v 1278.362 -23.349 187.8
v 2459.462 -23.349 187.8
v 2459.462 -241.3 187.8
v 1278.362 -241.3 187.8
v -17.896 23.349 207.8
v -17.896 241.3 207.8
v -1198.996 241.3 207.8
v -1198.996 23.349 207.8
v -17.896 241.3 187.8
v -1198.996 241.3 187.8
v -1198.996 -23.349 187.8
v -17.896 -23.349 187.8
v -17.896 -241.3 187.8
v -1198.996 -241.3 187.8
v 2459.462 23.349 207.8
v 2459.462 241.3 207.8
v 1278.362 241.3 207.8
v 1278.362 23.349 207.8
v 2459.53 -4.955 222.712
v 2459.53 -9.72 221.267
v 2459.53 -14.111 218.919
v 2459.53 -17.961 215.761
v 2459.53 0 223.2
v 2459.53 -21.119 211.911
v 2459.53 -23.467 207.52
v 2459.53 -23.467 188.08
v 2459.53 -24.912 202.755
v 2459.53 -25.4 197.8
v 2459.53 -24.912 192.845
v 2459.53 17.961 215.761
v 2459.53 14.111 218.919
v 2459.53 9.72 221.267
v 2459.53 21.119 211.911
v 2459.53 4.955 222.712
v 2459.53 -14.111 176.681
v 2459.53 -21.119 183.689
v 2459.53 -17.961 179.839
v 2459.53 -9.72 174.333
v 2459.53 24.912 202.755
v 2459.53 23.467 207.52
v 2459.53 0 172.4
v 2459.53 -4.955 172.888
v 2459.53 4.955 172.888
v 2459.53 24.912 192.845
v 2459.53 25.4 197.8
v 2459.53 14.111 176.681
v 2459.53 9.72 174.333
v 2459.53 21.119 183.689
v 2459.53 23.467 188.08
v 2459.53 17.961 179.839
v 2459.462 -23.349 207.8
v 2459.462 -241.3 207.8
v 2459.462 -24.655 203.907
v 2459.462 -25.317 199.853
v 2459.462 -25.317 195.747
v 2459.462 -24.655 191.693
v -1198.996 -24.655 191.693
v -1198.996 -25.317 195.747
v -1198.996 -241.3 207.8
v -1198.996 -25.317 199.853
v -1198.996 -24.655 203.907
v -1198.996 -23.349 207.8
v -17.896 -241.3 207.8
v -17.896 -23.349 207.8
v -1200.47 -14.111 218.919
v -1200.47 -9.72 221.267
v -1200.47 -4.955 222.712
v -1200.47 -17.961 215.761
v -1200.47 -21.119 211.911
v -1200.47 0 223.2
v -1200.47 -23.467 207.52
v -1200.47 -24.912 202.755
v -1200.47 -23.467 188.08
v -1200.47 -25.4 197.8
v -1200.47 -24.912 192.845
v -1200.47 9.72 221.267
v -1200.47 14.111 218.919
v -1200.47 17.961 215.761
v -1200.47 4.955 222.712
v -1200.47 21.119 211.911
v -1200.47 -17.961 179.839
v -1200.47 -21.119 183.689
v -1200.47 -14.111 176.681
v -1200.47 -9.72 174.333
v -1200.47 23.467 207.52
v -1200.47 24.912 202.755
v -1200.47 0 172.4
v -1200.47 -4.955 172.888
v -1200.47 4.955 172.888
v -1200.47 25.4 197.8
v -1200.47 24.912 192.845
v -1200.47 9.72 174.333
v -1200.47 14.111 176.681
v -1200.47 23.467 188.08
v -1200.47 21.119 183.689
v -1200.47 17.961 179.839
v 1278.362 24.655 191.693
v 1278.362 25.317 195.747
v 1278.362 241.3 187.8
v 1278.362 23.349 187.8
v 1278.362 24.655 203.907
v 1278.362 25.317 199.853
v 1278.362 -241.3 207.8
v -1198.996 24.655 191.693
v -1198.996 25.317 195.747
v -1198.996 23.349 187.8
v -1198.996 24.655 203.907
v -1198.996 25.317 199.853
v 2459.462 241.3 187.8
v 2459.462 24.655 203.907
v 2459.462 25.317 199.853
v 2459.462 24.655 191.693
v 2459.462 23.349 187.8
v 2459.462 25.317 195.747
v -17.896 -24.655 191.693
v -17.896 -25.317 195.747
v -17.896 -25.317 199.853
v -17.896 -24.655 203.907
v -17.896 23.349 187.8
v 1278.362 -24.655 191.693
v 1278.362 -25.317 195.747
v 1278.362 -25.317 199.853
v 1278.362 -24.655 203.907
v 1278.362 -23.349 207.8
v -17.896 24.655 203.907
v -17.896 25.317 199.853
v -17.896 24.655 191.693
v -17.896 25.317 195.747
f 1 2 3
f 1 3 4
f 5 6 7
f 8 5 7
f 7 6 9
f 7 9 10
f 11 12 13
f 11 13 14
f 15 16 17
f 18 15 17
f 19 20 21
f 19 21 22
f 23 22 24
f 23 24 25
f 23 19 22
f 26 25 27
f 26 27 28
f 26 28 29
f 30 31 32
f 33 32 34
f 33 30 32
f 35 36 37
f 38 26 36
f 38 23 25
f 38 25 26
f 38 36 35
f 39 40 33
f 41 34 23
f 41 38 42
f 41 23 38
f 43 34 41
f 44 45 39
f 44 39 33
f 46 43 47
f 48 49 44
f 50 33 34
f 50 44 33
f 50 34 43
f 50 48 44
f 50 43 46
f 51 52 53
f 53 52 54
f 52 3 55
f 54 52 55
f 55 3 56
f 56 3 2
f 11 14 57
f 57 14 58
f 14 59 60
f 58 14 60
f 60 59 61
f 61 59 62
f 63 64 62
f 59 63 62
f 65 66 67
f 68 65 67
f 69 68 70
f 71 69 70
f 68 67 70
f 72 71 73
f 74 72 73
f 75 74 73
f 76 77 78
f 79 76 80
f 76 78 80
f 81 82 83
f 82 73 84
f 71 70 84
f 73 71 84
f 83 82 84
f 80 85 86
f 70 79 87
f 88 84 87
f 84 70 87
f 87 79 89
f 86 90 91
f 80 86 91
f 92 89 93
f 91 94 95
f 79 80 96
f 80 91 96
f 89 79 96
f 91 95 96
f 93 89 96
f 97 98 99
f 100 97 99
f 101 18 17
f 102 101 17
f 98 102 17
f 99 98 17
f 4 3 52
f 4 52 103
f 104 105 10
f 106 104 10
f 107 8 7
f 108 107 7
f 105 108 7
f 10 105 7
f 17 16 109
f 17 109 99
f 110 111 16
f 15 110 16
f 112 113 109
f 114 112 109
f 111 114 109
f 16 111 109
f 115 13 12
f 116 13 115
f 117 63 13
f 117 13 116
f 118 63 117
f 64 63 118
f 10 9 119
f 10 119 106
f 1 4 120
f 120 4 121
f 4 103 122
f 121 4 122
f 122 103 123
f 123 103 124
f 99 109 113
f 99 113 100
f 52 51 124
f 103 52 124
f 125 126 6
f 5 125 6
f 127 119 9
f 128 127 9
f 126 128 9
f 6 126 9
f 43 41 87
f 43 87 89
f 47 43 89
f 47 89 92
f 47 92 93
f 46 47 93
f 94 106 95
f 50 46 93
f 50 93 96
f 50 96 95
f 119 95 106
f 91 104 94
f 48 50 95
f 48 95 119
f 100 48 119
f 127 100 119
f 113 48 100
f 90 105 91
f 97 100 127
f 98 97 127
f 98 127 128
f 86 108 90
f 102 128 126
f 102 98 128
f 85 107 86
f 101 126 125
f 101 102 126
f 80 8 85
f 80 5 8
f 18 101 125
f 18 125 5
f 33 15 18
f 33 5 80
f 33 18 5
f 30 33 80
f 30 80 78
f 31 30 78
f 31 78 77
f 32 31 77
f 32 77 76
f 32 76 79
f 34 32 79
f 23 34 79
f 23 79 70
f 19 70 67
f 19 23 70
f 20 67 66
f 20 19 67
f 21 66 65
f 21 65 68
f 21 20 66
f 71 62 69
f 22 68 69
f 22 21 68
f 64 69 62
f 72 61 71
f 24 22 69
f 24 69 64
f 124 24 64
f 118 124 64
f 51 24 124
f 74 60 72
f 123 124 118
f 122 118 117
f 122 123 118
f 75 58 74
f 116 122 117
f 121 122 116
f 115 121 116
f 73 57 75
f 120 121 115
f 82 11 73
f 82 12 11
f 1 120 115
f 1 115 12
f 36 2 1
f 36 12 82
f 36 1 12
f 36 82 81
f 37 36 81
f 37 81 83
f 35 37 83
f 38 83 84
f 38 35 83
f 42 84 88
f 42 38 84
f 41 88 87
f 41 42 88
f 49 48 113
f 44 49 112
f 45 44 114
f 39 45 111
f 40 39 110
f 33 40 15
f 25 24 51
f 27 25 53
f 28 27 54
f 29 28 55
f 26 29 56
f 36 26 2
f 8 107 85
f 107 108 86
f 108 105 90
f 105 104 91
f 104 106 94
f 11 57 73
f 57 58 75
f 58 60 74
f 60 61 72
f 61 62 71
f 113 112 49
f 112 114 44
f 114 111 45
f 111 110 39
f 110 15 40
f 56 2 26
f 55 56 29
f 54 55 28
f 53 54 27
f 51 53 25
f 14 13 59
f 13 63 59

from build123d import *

# Parameters (mm, degrees)
SKETCH6_R                = 25.4
BOSS_EXTRUDE1_DEPTH      = 3660
BOSS_EXTRUDE3_DEPTH      = 10
BOSS_EXTRUDE3_DEPTH_BACK = 10
SKETCH7_W                = 1181.1
SKETCH7_H                = 482.6


with BuildPart() as part:
    # Sketch6 → Boss-Extrude1 (new body)
    with BuildSketch(Plane(origin=(2459.529716421, 0, 0), x_dir=(0, 0, -1), z_dir=(1, 0, 0))):
        with Locations((-197.8, 0)):
            Circle(SKETCH6_R)
    extrude(amount=-BOSS_EXTRUDE1_DEPTH)

    # Sketch7 → Boss-Extrude3 (add, two sides: drawn at the far end of the back side and taken through both)
    with BuildSketch(Plane(origin=(0, 0, 197.8), x_dir=(-1, 0, 0), z_dir=(0, 0, -1)).offset(-BOSS_EXTRUDE3_DEPTH_BACK)):
        with Locations((-1868.912021376, 0)):
            Rectangle(SKETCH7_W, SKETCH7_H)
        with Locations((608.445512971, 0)):
            Rectangle(SKETCH7_W, SKETCH7_H)
    extrude(amount=BOSS_EXTRUDE3_DEPTH + BOSS_EXTRUDE3_DEPTH_BACK)


solid = part.part
